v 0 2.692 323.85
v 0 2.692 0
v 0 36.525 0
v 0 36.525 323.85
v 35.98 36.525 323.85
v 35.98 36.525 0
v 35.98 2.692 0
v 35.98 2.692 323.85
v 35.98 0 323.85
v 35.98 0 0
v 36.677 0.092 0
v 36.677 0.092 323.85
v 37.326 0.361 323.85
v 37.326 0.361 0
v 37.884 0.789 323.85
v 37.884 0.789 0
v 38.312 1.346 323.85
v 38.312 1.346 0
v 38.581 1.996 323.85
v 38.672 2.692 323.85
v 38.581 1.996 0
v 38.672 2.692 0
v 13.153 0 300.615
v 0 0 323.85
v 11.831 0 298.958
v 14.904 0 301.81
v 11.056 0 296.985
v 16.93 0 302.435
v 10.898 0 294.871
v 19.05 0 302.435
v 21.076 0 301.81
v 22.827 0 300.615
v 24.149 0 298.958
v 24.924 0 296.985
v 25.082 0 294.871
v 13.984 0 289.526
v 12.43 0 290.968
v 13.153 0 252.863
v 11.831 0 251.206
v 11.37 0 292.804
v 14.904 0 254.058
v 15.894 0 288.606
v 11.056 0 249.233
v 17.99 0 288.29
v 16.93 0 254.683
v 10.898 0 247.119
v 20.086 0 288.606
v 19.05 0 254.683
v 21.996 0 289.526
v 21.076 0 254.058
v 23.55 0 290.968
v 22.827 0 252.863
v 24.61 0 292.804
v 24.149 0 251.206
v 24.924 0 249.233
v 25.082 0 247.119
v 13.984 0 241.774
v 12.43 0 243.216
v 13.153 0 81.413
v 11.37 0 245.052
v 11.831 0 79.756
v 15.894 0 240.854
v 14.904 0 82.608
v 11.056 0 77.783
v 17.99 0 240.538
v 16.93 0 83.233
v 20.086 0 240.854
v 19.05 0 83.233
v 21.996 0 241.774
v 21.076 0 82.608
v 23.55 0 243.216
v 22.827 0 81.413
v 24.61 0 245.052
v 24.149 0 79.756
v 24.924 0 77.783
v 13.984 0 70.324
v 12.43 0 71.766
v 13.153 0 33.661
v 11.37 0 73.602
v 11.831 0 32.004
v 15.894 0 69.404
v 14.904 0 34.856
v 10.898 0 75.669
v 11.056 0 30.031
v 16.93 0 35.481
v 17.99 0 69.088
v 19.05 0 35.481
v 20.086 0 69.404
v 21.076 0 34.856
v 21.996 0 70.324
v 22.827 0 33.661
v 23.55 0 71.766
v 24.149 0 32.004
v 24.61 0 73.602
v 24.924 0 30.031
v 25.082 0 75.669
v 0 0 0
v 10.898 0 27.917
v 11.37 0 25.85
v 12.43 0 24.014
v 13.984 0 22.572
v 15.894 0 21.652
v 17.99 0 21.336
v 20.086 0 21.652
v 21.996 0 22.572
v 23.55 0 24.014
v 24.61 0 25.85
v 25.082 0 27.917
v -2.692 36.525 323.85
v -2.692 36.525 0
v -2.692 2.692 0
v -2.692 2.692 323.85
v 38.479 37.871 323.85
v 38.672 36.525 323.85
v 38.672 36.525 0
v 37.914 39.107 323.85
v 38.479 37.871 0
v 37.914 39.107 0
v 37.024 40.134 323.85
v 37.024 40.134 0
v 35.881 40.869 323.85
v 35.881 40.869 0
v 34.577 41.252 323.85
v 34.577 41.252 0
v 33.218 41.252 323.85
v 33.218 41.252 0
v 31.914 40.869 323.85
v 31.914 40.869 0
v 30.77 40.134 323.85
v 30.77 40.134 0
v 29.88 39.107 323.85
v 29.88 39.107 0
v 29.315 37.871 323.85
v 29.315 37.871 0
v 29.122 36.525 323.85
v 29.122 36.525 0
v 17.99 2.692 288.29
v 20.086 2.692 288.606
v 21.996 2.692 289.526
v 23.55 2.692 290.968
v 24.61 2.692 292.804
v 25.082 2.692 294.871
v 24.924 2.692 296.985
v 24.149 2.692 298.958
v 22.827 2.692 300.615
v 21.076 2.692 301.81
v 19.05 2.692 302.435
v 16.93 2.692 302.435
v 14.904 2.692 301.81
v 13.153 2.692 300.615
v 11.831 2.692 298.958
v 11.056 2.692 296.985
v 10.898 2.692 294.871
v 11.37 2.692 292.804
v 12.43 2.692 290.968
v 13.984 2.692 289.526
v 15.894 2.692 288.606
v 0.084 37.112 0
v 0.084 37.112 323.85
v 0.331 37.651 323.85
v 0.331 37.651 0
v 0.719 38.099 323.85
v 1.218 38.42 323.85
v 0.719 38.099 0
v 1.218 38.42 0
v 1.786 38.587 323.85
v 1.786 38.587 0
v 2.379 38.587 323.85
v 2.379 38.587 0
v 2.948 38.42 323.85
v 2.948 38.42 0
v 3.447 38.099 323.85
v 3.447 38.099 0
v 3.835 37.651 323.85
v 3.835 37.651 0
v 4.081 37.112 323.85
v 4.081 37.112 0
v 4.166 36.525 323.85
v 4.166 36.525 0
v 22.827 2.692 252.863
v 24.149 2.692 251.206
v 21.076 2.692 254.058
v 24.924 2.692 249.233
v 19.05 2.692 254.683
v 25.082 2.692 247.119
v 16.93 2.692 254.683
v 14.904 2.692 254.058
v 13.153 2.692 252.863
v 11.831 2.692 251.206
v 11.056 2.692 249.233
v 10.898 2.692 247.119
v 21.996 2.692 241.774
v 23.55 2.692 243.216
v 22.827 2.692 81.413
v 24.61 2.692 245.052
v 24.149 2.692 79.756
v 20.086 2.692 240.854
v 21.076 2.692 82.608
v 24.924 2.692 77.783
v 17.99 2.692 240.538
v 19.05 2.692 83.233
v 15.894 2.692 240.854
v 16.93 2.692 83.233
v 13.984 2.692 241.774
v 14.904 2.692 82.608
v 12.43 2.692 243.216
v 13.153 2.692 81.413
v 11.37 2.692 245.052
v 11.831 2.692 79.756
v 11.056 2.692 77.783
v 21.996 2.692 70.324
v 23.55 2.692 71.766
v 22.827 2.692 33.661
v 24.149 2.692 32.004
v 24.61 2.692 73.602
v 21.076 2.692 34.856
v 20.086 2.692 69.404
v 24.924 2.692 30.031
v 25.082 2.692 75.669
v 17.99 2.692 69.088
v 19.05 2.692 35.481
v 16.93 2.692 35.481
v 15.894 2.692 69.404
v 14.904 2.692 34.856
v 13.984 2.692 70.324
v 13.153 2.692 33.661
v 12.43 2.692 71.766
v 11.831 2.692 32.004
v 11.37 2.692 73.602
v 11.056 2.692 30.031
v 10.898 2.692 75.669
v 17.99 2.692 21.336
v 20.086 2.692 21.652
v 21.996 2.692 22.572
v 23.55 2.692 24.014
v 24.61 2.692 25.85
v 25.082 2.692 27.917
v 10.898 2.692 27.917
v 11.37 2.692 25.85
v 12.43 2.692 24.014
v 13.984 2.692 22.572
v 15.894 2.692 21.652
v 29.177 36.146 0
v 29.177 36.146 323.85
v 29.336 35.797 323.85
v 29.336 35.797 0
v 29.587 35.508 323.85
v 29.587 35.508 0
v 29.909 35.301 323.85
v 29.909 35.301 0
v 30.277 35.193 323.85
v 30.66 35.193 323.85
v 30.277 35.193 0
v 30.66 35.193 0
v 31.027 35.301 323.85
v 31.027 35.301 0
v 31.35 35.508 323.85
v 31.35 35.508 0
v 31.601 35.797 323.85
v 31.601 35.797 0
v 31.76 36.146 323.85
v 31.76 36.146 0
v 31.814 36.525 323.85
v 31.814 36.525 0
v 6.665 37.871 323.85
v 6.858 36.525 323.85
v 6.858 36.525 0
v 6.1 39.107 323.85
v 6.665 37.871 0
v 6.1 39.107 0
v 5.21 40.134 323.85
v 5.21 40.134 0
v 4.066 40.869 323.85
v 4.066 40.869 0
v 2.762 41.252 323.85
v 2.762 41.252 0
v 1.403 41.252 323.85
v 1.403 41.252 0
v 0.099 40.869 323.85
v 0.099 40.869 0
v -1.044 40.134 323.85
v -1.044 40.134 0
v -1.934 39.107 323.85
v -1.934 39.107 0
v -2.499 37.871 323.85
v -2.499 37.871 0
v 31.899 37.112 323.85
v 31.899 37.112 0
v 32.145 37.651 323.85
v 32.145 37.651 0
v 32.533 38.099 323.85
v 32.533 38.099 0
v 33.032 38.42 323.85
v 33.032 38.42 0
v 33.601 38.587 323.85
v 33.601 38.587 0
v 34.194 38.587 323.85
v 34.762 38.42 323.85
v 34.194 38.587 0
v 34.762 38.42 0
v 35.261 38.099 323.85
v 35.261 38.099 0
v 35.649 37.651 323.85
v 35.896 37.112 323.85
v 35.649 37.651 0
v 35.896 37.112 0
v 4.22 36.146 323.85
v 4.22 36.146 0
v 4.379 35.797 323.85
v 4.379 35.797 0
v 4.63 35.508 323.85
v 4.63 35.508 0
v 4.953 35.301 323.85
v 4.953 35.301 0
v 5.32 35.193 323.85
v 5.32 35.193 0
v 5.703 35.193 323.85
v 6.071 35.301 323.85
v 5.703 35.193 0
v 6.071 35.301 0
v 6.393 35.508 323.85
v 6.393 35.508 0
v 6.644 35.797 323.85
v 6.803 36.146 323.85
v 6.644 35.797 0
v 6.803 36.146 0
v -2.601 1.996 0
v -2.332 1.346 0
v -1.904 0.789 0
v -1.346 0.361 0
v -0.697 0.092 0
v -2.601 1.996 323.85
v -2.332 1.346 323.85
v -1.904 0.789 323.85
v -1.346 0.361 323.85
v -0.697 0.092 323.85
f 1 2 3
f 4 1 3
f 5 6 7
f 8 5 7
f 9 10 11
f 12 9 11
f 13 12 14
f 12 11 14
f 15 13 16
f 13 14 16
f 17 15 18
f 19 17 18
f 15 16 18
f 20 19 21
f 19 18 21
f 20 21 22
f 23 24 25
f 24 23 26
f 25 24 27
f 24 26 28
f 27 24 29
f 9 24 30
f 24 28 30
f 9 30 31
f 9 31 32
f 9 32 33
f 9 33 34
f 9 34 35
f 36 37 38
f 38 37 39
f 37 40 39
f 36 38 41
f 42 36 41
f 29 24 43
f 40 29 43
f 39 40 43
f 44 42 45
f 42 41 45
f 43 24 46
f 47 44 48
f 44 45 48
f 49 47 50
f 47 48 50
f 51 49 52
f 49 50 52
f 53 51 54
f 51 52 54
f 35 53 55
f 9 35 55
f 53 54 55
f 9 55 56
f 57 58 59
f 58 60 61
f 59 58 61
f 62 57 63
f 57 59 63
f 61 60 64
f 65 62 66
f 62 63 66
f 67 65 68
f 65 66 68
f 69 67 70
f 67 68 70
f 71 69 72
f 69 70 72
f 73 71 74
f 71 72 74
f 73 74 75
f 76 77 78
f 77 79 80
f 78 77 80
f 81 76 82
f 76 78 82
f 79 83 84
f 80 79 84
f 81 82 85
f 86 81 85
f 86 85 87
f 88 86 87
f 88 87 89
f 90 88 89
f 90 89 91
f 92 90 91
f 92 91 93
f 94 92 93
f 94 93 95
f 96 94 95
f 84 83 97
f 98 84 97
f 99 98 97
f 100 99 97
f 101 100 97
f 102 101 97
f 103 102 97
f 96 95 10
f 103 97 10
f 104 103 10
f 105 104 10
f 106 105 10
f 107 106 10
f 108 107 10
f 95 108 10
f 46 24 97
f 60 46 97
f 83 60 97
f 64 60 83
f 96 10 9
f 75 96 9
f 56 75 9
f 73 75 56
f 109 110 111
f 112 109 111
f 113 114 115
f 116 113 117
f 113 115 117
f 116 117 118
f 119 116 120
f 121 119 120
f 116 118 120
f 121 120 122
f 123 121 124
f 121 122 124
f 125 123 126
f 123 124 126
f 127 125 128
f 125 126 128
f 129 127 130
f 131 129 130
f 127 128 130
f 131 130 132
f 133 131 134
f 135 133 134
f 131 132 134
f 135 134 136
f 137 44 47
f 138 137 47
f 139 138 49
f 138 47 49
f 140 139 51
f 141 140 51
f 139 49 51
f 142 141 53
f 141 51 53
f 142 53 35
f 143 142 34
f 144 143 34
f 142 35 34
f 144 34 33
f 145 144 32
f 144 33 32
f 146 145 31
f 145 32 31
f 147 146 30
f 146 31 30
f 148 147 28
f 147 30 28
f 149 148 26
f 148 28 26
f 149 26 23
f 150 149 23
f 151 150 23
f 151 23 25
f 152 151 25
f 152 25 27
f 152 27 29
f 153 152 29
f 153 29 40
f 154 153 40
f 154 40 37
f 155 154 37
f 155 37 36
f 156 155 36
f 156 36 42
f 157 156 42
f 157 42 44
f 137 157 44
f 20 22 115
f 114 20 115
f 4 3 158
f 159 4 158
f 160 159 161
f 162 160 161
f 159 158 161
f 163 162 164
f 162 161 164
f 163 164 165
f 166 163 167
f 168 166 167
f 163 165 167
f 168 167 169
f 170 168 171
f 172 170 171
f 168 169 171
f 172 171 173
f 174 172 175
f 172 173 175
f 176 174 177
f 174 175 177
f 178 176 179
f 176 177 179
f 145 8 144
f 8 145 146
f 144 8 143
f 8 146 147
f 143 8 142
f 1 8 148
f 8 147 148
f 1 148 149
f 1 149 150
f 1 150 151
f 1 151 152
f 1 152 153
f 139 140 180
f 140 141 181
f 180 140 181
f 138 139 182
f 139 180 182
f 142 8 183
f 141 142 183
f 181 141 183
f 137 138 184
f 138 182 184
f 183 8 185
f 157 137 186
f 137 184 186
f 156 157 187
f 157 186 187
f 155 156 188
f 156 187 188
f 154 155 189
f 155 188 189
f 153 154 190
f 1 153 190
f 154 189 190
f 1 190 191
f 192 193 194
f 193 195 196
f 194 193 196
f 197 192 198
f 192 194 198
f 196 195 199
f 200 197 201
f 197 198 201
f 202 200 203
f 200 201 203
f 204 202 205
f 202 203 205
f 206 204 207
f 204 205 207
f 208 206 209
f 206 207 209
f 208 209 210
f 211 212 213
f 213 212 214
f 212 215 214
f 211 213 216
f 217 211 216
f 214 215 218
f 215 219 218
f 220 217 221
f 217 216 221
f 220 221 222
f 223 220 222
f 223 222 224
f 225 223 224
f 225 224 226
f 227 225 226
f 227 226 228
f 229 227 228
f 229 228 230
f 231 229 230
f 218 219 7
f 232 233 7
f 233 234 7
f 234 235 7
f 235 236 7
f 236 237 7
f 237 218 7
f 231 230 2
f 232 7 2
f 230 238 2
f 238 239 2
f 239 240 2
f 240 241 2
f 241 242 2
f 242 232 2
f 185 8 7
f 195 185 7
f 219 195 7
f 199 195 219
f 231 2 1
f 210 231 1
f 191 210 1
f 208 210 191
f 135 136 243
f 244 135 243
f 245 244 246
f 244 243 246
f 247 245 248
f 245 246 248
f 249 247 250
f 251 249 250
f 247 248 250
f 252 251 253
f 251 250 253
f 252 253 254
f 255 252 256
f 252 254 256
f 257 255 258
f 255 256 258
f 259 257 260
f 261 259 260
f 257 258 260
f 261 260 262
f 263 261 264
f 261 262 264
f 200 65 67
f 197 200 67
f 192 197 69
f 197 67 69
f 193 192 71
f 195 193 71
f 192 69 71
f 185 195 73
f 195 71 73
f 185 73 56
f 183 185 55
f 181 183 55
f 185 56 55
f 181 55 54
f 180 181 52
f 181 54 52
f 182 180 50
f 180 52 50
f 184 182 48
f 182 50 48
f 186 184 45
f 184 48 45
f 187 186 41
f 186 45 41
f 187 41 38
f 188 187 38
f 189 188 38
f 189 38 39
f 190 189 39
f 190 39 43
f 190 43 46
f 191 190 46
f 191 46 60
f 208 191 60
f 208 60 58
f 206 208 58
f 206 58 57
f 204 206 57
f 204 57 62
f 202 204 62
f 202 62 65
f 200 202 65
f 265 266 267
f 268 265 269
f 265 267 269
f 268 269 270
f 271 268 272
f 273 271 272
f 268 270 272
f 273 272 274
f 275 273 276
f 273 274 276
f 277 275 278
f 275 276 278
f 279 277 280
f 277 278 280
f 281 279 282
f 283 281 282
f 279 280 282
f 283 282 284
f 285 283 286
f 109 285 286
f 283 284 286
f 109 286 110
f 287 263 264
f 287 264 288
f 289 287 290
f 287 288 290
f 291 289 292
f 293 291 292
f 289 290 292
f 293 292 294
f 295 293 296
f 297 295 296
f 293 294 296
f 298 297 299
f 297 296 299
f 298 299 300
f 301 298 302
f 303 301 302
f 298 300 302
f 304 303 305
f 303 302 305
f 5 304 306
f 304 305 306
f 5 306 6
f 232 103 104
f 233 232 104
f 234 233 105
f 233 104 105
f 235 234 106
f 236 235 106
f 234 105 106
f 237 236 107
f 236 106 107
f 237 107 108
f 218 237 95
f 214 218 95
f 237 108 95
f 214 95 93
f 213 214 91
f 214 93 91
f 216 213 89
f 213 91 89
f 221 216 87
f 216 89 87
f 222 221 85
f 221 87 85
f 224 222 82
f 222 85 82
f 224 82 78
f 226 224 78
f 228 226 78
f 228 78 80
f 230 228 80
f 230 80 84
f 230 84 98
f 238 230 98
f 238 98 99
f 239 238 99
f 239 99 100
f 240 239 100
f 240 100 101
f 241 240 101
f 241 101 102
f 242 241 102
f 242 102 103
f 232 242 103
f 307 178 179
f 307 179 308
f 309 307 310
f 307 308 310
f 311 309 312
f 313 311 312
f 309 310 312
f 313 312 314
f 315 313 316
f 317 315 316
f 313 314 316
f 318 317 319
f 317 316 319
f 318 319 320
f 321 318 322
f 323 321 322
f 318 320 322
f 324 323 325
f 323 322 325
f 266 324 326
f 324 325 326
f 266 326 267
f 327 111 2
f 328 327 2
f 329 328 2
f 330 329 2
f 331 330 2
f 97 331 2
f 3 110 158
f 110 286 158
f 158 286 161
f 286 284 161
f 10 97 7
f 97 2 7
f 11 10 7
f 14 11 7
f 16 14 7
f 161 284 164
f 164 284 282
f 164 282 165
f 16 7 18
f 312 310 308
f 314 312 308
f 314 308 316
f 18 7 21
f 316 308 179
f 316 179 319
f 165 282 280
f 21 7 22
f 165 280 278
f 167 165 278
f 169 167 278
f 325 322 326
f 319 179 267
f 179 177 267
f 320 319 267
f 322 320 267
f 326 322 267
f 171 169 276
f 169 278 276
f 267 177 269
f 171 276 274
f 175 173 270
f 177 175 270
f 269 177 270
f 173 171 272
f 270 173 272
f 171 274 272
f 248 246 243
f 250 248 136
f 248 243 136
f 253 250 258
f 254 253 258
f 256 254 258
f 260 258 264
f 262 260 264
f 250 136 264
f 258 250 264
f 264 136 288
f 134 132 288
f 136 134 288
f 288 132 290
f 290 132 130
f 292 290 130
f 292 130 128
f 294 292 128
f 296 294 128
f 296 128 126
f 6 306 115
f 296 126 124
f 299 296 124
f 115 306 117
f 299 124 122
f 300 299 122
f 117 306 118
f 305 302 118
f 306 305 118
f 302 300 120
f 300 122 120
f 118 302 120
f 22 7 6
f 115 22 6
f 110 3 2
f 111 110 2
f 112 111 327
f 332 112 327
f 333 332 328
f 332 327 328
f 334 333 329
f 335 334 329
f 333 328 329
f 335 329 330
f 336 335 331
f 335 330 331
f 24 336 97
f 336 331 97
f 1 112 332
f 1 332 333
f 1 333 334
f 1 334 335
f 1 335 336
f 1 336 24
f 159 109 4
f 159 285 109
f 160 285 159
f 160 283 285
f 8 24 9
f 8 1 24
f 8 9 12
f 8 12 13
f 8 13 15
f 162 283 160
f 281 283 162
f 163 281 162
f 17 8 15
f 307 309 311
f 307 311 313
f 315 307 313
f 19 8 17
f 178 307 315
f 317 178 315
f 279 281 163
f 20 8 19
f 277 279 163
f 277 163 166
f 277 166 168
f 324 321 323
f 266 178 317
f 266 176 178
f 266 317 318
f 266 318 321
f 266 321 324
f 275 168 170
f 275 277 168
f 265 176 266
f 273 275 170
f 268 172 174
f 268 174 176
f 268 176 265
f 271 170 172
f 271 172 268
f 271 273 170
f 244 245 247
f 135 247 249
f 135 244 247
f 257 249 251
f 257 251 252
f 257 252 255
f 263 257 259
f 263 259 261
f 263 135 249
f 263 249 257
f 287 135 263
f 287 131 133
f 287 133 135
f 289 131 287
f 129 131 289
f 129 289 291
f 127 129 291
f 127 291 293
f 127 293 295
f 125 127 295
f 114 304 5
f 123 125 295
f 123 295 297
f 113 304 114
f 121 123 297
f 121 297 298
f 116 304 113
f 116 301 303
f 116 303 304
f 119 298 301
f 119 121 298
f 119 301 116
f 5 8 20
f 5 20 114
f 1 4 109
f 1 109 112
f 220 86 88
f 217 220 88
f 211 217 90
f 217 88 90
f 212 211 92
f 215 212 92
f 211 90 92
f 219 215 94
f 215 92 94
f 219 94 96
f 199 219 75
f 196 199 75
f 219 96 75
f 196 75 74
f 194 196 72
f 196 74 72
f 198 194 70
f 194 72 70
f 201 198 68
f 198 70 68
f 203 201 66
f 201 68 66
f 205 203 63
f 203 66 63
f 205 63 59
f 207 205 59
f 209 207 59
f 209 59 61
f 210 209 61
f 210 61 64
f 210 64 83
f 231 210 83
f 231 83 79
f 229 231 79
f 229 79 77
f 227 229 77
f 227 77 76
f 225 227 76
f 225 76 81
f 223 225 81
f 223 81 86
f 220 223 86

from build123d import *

# Parameters (mm, degrees)
EXTRUDE_1_DEPTH     = 323.85
SKETCH_2_R          = 7.112
CUT_EXTRUDE_1_DEPTH = 329.755380278


with BuildPart() as part:
    # 草图1 → 凸台-拉伸1 (new body)
    with BuildSketch(Plane.XY):
        with BuildLine():
            Line((0, 0), (35.98, 0))
            ThreePointArc((35.98, 0), (37.883814298, 0.788585702), (38.6724, 2.6924))
            Line((38.6724, 2.6924), (38.6724, 36.5252))
            ThreePointArc((38.6724, 36.5252), (33.8972, 41.3004), (29.122, 36.5252))
            ThreePointArc((29.122, 36.5252), (30.4682, 35.179), (31.8144, 36.5252))
            ThreePointArc((31.8144, 36.5252), (33.8972, 38.608), (35.98, 36.5252))
            Line((35.98, 36.5252), (35.98, 2.6924))
            Line((35.98, 2.6924), (0, 2.6924))
            Line((0, 2.6924), (0, 36.5252))
            ThreePointArc((0, 36.5252), (2.0828, 38.608), (4.1656, 36.5252))
            ThreePointArc((4.1656, 36.5252), (5.5118, 35.179), (6.858, 36.5252))
            ThreePointArc((6.858, 36.5252), (2.0828, 41.3004), (-2.6924, 36.5252))
            Line((-2.6924, 36.5252), (-2.6924, 2.6924))
            ThreePointArc((-2.6924, 2.6924), (-1.903814298, 0.788585702), (0, 0))
        make_face()
    extrude(amount=EXTRUDE_1_DEPTH)

    # 草图2 → 切除-拉伸1 (cut, through all)
    with BuildSketch(Plane(origin=(0, 0, 0), x_dir=(-1, 0, 0), z_dir=(0, -1, 0))):
        with Locations(Location((-17.99, -28.448, 0), (0, 0, 90))):
            Circle(SKETCH_2_R)
        with Locations(Location((-17.99, -76.2, 0), (0, 0, 90))):
            Circle(SKETCH_2_R)
        with Locations(Location((-17.99, -295.402, 0), (0, 0, 90))):
            Circle(SKETCH_2_R)
        with Locations(Location((-17.99, -247.65, 0), (0, 0, 90))):
            Circle(SKETCH_2_R)
    extrude(amount=-CUT_EXTRUDE_1_DEPTH, mode=Mode.SUBTRACT)


solid = part.part
